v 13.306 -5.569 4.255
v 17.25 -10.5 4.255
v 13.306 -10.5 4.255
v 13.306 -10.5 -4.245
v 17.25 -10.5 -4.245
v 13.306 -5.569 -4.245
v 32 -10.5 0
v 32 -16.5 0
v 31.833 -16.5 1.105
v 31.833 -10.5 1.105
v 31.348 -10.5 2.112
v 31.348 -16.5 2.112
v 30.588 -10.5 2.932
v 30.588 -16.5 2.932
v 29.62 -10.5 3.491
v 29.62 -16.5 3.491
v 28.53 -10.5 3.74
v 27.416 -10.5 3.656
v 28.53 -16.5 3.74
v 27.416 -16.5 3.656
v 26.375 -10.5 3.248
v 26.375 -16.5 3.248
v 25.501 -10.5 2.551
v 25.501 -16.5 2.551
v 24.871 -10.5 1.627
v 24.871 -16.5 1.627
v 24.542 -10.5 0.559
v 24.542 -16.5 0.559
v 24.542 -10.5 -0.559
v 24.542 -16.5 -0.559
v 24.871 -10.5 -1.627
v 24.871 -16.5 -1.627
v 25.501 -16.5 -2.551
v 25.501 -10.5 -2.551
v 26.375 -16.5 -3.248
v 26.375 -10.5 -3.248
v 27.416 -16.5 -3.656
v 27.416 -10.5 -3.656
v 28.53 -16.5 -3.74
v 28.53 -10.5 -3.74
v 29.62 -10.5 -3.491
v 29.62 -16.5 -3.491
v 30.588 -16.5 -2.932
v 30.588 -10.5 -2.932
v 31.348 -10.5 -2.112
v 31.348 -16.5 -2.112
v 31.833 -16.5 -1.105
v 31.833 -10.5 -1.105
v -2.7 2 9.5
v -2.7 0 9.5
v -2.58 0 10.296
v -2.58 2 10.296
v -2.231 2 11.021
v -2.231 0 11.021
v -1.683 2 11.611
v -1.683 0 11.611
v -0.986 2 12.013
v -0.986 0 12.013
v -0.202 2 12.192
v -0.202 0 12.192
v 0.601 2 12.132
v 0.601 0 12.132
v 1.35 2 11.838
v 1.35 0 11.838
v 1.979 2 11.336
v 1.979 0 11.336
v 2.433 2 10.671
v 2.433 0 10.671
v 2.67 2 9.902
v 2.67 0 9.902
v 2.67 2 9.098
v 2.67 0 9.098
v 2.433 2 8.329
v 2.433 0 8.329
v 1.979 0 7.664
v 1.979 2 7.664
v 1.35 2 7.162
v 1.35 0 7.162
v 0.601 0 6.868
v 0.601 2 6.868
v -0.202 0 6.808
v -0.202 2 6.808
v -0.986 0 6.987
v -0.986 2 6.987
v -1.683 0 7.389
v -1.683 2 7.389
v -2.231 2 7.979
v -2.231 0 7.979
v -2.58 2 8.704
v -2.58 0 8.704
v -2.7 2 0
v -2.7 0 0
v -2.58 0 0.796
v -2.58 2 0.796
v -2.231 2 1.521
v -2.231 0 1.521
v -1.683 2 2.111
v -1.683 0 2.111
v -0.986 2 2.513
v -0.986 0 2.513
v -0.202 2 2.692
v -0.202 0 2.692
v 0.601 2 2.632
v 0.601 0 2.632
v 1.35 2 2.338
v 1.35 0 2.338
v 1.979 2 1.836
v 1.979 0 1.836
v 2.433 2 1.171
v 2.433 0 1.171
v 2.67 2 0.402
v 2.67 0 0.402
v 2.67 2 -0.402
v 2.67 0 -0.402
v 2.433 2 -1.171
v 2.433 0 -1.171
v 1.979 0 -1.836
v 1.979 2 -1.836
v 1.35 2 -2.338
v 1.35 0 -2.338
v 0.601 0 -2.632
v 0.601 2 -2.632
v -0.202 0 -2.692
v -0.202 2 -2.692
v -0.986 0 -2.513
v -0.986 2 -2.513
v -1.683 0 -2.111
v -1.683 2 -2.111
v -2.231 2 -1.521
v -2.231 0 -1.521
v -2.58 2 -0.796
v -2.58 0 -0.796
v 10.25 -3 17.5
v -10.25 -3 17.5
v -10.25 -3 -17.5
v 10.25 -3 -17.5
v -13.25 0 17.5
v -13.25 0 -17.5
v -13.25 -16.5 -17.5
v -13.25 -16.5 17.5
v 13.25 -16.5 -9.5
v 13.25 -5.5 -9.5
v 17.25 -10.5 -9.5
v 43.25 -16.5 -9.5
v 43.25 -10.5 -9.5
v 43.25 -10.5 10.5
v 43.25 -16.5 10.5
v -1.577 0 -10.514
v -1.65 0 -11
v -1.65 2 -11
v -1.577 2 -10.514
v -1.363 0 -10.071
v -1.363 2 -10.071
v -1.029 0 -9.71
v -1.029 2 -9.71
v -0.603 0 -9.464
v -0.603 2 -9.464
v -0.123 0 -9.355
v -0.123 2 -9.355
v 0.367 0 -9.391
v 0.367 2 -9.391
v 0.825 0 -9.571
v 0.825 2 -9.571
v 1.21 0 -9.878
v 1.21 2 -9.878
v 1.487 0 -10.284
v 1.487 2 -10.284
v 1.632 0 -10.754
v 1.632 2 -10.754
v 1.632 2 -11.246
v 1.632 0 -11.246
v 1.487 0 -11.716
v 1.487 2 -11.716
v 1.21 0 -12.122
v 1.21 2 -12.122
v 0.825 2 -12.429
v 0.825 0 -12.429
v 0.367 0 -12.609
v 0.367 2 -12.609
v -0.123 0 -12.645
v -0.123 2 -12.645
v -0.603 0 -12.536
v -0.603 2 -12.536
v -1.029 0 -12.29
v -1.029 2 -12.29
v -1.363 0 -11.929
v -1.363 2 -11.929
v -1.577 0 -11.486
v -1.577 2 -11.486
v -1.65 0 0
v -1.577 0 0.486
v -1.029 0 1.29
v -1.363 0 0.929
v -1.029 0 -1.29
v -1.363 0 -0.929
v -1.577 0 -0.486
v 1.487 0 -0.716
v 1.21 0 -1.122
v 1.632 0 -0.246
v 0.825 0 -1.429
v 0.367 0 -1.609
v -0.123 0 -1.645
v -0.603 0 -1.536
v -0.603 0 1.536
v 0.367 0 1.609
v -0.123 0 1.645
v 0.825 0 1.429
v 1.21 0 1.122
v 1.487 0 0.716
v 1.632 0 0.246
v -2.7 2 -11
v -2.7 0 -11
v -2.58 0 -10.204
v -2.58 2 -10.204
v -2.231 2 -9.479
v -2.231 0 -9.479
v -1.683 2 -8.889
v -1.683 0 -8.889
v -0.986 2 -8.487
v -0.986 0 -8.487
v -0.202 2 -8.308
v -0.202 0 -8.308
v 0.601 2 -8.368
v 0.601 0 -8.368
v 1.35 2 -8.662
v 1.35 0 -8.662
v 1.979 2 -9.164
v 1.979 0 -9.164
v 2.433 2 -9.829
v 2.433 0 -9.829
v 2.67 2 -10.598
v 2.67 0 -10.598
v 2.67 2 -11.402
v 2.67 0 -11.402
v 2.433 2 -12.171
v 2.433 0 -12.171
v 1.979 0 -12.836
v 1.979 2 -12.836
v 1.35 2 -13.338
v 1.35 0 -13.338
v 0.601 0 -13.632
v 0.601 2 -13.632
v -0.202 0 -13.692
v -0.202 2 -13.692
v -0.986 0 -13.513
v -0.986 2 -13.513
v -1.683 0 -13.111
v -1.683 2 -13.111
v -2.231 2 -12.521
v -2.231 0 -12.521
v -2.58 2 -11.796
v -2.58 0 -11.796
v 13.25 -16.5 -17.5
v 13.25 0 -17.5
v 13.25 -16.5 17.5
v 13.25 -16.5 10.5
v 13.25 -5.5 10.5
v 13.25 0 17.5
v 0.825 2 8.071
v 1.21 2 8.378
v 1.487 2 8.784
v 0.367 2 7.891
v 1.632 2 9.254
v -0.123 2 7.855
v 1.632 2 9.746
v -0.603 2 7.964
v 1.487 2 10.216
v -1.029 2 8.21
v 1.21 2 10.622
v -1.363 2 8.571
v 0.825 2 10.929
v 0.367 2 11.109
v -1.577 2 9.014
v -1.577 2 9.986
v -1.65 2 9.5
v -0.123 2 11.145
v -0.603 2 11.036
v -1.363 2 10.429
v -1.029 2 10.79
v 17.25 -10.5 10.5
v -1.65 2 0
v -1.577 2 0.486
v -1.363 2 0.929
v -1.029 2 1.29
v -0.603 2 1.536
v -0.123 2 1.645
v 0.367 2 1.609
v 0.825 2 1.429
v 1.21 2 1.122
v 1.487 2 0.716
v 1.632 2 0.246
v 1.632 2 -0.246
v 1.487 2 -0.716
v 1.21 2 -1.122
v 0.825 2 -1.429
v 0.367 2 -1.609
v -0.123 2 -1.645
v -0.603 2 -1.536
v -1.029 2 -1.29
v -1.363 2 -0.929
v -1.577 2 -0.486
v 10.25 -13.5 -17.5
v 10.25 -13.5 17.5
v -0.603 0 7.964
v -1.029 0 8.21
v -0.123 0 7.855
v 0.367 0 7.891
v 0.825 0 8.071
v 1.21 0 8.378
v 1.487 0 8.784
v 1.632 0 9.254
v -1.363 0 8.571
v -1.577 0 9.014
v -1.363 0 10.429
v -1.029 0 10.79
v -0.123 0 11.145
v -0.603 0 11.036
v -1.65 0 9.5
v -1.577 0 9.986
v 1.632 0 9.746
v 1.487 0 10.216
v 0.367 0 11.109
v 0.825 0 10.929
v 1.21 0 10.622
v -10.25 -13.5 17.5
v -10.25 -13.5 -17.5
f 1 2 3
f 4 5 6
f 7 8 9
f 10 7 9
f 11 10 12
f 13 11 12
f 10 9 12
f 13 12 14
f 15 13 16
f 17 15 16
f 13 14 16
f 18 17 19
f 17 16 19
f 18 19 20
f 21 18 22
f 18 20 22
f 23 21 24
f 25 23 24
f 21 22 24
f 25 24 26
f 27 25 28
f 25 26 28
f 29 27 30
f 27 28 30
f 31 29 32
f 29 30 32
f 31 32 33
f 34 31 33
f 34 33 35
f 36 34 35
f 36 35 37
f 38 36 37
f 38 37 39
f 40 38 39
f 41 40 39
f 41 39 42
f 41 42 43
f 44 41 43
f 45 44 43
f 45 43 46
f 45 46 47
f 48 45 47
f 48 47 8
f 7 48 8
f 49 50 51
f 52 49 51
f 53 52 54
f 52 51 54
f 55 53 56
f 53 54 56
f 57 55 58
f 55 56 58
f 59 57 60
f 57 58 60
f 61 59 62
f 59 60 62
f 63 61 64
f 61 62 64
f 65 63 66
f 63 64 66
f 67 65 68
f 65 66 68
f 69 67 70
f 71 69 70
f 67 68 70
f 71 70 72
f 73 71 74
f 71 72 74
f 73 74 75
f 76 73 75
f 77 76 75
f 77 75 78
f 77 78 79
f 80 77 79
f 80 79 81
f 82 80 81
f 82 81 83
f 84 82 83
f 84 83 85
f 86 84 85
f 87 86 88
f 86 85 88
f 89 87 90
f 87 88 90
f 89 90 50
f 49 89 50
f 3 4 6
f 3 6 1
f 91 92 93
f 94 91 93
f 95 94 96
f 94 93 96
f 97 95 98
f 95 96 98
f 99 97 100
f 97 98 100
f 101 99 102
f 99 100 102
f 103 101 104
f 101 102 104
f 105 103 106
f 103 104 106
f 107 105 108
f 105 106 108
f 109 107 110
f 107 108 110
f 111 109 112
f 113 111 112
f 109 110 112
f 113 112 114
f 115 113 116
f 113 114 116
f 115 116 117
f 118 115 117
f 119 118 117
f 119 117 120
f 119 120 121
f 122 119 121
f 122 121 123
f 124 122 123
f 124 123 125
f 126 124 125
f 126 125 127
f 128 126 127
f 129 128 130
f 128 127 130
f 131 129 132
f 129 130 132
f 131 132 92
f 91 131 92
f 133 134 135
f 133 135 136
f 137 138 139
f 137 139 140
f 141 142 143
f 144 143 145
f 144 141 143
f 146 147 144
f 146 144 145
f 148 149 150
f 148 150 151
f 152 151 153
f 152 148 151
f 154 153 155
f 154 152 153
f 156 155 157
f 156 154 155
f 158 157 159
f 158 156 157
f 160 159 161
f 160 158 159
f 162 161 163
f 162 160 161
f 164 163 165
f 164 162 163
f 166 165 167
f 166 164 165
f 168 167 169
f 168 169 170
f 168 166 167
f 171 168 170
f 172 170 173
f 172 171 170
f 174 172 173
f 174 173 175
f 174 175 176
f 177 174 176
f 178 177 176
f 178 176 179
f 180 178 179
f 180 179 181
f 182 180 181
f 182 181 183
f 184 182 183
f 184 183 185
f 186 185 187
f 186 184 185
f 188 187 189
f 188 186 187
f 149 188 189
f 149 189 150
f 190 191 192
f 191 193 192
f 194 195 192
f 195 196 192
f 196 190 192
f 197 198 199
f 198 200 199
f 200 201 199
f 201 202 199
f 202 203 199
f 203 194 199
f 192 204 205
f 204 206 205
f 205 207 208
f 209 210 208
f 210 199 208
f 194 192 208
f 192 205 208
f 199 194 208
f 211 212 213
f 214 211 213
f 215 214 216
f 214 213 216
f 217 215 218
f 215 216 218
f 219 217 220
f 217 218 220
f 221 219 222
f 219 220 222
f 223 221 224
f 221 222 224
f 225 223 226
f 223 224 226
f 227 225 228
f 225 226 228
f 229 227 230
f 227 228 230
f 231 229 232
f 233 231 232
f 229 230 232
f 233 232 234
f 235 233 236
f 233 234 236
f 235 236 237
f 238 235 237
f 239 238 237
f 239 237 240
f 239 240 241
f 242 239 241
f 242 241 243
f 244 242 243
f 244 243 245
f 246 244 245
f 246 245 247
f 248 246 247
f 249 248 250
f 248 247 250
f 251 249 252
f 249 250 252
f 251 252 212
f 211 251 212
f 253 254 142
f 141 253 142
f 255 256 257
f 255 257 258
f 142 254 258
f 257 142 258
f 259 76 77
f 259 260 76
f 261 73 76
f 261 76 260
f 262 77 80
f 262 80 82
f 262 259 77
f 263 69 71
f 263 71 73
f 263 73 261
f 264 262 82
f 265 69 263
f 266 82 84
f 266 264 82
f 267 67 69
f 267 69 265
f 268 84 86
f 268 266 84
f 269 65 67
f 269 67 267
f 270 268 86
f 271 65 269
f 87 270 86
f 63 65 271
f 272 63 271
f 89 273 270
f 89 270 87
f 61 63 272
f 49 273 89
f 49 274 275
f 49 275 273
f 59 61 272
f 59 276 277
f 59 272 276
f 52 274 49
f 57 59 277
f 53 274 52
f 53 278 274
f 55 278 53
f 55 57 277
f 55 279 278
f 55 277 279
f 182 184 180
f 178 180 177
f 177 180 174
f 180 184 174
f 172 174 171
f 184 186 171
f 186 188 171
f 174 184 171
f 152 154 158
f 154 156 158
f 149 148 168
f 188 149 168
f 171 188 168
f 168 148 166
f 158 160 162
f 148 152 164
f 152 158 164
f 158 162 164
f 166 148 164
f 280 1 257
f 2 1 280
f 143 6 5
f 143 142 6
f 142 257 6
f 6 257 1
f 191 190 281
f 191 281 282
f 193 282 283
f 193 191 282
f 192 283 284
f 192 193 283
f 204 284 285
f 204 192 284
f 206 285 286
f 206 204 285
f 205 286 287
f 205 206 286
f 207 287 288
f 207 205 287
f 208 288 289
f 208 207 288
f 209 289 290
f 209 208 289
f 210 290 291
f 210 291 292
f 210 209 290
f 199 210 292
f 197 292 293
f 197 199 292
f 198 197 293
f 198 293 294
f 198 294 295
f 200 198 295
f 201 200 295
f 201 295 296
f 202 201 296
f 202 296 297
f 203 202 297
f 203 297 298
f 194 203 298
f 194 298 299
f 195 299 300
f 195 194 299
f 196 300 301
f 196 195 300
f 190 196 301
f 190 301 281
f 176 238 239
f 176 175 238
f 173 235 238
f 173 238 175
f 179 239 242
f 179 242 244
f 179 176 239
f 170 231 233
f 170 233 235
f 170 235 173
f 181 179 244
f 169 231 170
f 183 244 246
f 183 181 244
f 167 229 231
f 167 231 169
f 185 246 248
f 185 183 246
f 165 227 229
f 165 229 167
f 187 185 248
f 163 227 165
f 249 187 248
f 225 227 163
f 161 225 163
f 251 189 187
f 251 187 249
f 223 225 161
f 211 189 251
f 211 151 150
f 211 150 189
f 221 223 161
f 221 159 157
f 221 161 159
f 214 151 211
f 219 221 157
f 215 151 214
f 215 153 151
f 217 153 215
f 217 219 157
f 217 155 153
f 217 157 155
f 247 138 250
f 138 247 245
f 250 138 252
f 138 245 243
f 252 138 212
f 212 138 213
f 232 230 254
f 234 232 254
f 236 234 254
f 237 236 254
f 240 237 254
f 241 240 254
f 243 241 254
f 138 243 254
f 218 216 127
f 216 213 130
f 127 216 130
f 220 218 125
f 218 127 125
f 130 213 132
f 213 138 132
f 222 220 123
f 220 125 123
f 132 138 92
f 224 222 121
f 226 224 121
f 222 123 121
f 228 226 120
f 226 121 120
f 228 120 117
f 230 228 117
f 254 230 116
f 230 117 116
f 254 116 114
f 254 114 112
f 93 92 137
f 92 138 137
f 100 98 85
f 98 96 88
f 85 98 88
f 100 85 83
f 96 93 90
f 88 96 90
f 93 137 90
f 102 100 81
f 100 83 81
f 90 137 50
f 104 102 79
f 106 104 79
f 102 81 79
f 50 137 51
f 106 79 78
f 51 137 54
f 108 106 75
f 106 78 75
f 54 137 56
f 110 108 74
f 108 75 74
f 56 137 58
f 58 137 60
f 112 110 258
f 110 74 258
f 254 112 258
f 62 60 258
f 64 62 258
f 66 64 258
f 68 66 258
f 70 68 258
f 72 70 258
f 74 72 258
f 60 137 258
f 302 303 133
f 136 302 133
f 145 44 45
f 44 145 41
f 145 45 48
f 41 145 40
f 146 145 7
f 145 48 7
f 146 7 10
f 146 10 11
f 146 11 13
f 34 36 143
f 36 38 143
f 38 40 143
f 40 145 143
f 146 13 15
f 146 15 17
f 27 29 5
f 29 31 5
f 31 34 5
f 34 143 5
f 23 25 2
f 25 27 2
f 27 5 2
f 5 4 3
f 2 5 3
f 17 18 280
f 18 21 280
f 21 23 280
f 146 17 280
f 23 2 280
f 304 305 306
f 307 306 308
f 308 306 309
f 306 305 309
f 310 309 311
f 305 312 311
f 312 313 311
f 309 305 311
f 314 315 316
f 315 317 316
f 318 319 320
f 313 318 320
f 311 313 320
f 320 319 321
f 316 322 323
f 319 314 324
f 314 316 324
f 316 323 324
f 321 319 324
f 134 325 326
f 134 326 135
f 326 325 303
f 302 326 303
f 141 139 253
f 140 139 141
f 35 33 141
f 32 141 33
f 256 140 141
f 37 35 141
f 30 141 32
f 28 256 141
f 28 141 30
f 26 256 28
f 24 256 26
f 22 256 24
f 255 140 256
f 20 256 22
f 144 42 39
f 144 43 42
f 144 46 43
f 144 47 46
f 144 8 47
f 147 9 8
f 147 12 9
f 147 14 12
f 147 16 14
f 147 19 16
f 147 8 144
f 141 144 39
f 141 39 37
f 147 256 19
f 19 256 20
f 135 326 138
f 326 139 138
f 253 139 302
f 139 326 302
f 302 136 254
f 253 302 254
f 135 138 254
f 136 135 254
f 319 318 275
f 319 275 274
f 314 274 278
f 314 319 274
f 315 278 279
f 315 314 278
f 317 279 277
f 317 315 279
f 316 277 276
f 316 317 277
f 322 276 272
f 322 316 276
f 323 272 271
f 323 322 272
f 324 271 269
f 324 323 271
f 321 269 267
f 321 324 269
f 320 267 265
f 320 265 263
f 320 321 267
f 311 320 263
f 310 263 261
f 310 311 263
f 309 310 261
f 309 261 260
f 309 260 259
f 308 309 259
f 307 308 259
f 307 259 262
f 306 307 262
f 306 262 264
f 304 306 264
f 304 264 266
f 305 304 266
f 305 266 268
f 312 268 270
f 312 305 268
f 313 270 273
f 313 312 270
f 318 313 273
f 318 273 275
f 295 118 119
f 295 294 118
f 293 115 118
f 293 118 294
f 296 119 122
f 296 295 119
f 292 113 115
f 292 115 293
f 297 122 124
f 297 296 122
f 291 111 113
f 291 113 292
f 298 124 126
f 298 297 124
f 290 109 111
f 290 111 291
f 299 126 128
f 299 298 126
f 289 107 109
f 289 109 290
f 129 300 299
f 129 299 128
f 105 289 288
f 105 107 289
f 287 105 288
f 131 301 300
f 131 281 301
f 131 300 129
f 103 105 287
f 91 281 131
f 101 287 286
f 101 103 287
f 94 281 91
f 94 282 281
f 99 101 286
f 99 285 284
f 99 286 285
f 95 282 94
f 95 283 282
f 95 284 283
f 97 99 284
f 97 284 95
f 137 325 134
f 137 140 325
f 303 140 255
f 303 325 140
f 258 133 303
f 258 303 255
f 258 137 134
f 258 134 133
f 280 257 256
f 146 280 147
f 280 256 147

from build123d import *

# Parameters (mm, degrees)
F0_W      = 26.5
F0_H      = 35
F1_DEPTH  = 16.5
F2_W      = 20.5
F2_H      = 10.5
F3_DEPTH  = 35
F4_W      = 6
F4_H      = 20
F5_DEPTH  = 30
F7_DEPTH  = 20
F8_R      = 3.75
F9_DEPTH  = 25
F10_W     = 3.944425
F10_H     = 8.5
F11_DEPTH = 25
F12_R     = 2.7
F12_R_2   = 1.65
F13_DEPTH = 2


with BuildPart() as f1:
    # F0 (on Front) → F1 (new body)
    with BuildSketch(Plane.XZ):
        Rectangle(F0_W, F0_H)
    extrude(amount=F1_DEPTH)

    # F2 (on face) → F3 (cut)
    with BuildSketch(Plane.XY.offset(17.5)):
        with Locations((0, -8.25)):
            Rectangle(F2_W, F2_H)
    extrude(amount=-F3_DEPTH, mode=Mode.SUBTRACT)

    # F4 (on face) → F5 (join)
    with BuildSketch(Plane.YZ.offset(13.25)):
        with Locations((-13.5, 0.5)):
            Rectangle(F4_W, F4_H)
    extrude(amount=F5_DEPTH)

    # F6 (on face) → F7 (join)
    with BuildSketch(Plane(origin=(0, 0, -9.5), x_dir=(1, 0, 0), z_dir=(0, 0, -1))):
        Polygon((13.25, 5.5), (17.25, 10.5), (13.25, 10.5), align=None)
    extrude(amount=-F7_DEPTH)

    # F8 (on face) → F9 (cut)
    with BuildSketch(Plane.XZ.offset(16.5)):
        with Locations((28.25, 0)):
            Circle(F8_R)
    extrude(amount=-F9_DEPTH, mode=Mode.SUBTRACT)

    # F10 (on face) → F11 (cut)
    with BuildSketch(Plane(origin=(0, -10.5, 0), x_dir=(-1, 0, 0), z_dir=(0, 1, 0))):
        with Locations((-15.277787, 0.005)):
            Rectangle(F10_W, F10_H)
    extrude(amount=F11_DEPTH, mode=Mode.SUBTRACT)

    # F12 (on face) → F13 (join)
    with BuildSketch(Plane(origin=(0, 0, 0), x_dir=(-1, 0, 0), z_dir=(0, 1, 0))):
        Circle(F12_R)
        Circle(F12_R_2, mode=Mode.SUBTRACT)
        with Locations((0, 9.5)):
            Circle(F12_R)
        with Locations((0, 9.5)):
            Circle(F12_R_2, mode=Mode.SUBTRACT)
        with Locations((0, -11)):
            Circle(F12_R)
        with Locations((0, -11)):
            Circle(F12_R_2, mode=Mode.SUBTRACT)
    extrude(amount=F13_DEPTH)


solid = f1.part
